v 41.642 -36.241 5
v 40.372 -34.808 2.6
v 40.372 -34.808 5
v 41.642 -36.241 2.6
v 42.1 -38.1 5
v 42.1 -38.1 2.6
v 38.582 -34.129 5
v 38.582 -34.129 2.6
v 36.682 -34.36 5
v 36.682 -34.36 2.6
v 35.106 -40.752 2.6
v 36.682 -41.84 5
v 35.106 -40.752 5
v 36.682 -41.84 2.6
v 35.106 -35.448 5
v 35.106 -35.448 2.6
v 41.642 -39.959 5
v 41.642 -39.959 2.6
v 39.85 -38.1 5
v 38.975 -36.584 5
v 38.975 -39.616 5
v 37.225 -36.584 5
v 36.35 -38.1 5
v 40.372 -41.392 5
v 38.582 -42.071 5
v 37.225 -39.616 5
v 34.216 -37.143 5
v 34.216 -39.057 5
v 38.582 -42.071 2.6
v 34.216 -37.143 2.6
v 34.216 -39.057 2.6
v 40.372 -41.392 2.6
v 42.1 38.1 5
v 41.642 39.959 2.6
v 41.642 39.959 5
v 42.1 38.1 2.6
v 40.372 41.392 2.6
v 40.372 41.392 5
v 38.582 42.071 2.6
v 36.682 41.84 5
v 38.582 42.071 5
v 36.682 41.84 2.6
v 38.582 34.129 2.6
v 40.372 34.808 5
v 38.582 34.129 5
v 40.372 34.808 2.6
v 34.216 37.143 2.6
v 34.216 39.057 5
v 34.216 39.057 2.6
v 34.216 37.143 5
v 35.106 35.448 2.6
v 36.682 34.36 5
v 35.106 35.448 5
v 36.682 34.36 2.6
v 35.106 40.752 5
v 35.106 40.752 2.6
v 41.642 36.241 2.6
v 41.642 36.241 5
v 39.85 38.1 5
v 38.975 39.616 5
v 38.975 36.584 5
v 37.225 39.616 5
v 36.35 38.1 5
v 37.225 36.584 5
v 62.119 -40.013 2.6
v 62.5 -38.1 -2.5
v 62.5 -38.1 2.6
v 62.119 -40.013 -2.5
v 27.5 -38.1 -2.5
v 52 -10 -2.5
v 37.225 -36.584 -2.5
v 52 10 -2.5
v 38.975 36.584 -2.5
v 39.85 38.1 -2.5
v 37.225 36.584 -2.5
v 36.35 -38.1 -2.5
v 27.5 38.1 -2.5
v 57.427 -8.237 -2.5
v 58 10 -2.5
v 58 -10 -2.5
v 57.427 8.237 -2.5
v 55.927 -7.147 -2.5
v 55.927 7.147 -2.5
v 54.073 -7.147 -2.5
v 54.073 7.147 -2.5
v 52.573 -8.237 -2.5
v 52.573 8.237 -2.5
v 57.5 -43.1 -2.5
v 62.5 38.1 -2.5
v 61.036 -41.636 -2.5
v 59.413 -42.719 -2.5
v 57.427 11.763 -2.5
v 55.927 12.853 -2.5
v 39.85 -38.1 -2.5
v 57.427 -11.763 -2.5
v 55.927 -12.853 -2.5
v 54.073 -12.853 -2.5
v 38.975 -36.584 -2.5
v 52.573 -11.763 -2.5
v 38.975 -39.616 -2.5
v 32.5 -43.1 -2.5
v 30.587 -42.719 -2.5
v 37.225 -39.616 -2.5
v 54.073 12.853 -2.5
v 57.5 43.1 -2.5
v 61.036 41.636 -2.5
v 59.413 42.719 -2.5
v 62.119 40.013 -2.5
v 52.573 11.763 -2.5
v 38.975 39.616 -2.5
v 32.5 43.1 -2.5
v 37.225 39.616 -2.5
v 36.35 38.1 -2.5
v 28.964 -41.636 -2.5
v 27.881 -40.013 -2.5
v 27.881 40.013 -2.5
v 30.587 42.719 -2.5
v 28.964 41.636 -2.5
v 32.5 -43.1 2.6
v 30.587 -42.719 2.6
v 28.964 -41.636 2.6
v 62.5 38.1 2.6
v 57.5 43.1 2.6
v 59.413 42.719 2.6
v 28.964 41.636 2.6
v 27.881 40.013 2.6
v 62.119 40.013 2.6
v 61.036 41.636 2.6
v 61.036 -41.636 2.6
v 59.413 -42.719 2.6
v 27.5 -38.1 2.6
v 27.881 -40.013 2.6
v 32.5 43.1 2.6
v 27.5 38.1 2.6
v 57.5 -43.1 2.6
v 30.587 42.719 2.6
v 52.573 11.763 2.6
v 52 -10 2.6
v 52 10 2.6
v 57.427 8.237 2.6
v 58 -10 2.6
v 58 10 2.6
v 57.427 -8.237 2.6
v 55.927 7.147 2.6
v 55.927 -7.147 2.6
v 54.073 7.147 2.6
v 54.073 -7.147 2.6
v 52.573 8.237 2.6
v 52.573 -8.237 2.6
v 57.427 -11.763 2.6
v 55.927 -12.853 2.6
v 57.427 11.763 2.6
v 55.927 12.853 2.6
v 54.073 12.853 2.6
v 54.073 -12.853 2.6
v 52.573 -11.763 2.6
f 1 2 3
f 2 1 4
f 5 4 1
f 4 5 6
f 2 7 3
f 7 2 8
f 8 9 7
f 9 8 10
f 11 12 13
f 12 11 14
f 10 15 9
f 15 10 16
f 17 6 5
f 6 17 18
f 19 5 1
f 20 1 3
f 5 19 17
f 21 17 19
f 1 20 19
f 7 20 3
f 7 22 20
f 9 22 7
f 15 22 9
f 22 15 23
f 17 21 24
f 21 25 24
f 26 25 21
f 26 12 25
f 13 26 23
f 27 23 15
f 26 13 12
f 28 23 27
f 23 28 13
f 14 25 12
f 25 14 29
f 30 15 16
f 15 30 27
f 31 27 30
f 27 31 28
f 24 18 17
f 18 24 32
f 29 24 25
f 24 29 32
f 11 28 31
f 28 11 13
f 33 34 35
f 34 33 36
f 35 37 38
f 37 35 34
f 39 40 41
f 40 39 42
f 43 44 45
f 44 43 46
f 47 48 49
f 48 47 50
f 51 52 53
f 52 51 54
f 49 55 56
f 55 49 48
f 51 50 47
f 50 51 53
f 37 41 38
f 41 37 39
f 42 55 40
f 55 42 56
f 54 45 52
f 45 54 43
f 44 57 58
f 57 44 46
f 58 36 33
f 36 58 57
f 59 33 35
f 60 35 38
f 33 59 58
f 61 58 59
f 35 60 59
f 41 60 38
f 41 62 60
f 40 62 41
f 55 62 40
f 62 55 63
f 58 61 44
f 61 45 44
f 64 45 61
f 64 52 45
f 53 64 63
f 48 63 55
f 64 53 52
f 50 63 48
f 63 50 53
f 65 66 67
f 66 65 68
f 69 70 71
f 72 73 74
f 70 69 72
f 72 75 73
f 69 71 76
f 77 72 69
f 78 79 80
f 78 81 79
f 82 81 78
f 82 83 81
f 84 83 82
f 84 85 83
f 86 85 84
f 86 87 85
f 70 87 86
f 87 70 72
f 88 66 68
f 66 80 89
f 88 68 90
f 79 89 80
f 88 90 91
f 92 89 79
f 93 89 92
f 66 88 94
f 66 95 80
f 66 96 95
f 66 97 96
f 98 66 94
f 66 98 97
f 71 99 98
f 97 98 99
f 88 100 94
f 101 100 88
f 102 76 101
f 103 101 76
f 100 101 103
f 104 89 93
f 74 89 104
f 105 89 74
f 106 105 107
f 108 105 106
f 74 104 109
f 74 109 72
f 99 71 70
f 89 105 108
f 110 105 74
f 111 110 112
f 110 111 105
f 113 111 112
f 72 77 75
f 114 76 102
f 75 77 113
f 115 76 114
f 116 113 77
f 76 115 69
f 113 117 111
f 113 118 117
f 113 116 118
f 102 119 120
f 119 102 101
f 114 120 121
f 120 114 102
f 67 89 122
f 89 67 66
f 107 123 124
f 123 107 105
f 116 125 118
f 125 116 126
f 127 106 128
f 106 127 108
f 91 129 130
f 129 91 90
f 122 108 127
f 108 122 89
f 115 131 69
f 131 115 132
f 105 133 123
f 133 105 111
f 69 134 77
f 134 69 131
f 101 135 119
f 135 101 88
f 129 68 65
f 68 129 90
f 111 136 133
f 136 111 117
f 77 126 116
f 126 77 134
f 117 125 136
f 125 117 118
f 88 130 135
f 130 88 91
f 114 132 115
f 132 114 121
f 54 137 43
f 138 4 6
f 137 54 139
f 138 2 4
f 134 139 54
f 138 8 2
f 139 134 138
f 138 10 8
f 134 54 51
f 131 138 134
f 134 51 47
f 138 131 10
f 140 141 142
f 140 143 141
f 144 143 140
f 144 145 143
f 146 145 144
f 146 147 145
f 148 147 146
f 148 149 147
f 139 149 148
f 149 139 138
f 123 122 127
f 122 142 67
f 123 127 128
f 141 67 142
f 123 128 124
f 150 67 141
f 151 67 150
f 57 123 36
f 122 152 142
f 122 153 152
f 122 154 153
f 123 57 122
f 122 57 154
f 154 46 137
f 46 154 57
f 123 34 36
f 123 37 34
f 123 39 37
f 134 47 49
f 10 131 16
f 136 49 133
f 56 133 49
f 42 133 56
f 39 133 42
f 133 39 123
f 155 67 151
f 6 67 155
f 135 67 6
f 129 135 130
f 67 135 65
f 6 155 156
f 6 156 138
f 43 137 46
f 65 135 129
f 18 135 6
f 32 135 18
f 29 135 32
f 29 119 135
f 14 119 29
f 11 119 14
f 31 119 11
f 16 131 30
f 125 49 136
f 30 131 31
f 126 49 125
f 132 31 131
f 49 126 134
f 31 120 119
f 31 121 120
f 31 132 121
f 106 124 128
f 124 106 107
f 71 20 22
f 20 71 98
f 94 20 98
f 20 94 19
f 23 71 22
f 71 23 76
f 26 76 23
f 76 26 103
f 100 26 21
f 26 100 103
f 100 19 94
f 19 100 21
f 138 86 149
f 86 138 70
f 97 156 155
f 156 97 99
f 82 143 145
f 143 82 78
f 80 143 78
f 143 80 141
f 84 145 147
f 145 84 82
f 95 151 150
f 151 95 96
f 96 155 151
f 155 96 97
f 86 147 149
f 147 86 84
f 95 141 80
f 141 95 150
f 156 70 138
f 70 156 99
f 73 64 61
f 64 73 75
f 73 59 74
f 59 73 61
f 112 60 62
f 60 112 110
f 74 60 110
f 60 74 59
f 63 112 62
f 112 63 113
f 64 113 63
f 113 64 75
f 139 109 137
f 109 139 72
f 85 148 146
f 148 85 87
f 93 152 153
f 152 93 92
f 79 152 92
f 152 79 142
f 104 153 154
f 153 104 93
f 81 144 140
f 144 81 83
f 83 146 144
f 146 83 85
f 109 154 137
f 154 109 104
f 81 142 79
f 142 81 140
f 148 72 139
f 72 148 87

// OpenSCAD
x=1;

difference() {
    union() {
        minkowski() {
          translate([45, 0, 0])
            cube([25, 3*25.4, 5], center=true);
          cylinder(h=0.1, r=5);
        }
        for(y=[-1:2:1]) {
            translate([x*1.5*25.4, y*1.5*25.4, 0])
              cylinder(h=5, d=8);
        }
    }
    
    for(y=[-1:2:1]) {
        translate([x*1.5*25.4, y*1.5*25.4, 0])
          cylinder(h=20, d=3.5, center=true);
        
        translate([x*55, y*10, 0])
          cylinder(h=20, d=6, center=true);
    }
}
